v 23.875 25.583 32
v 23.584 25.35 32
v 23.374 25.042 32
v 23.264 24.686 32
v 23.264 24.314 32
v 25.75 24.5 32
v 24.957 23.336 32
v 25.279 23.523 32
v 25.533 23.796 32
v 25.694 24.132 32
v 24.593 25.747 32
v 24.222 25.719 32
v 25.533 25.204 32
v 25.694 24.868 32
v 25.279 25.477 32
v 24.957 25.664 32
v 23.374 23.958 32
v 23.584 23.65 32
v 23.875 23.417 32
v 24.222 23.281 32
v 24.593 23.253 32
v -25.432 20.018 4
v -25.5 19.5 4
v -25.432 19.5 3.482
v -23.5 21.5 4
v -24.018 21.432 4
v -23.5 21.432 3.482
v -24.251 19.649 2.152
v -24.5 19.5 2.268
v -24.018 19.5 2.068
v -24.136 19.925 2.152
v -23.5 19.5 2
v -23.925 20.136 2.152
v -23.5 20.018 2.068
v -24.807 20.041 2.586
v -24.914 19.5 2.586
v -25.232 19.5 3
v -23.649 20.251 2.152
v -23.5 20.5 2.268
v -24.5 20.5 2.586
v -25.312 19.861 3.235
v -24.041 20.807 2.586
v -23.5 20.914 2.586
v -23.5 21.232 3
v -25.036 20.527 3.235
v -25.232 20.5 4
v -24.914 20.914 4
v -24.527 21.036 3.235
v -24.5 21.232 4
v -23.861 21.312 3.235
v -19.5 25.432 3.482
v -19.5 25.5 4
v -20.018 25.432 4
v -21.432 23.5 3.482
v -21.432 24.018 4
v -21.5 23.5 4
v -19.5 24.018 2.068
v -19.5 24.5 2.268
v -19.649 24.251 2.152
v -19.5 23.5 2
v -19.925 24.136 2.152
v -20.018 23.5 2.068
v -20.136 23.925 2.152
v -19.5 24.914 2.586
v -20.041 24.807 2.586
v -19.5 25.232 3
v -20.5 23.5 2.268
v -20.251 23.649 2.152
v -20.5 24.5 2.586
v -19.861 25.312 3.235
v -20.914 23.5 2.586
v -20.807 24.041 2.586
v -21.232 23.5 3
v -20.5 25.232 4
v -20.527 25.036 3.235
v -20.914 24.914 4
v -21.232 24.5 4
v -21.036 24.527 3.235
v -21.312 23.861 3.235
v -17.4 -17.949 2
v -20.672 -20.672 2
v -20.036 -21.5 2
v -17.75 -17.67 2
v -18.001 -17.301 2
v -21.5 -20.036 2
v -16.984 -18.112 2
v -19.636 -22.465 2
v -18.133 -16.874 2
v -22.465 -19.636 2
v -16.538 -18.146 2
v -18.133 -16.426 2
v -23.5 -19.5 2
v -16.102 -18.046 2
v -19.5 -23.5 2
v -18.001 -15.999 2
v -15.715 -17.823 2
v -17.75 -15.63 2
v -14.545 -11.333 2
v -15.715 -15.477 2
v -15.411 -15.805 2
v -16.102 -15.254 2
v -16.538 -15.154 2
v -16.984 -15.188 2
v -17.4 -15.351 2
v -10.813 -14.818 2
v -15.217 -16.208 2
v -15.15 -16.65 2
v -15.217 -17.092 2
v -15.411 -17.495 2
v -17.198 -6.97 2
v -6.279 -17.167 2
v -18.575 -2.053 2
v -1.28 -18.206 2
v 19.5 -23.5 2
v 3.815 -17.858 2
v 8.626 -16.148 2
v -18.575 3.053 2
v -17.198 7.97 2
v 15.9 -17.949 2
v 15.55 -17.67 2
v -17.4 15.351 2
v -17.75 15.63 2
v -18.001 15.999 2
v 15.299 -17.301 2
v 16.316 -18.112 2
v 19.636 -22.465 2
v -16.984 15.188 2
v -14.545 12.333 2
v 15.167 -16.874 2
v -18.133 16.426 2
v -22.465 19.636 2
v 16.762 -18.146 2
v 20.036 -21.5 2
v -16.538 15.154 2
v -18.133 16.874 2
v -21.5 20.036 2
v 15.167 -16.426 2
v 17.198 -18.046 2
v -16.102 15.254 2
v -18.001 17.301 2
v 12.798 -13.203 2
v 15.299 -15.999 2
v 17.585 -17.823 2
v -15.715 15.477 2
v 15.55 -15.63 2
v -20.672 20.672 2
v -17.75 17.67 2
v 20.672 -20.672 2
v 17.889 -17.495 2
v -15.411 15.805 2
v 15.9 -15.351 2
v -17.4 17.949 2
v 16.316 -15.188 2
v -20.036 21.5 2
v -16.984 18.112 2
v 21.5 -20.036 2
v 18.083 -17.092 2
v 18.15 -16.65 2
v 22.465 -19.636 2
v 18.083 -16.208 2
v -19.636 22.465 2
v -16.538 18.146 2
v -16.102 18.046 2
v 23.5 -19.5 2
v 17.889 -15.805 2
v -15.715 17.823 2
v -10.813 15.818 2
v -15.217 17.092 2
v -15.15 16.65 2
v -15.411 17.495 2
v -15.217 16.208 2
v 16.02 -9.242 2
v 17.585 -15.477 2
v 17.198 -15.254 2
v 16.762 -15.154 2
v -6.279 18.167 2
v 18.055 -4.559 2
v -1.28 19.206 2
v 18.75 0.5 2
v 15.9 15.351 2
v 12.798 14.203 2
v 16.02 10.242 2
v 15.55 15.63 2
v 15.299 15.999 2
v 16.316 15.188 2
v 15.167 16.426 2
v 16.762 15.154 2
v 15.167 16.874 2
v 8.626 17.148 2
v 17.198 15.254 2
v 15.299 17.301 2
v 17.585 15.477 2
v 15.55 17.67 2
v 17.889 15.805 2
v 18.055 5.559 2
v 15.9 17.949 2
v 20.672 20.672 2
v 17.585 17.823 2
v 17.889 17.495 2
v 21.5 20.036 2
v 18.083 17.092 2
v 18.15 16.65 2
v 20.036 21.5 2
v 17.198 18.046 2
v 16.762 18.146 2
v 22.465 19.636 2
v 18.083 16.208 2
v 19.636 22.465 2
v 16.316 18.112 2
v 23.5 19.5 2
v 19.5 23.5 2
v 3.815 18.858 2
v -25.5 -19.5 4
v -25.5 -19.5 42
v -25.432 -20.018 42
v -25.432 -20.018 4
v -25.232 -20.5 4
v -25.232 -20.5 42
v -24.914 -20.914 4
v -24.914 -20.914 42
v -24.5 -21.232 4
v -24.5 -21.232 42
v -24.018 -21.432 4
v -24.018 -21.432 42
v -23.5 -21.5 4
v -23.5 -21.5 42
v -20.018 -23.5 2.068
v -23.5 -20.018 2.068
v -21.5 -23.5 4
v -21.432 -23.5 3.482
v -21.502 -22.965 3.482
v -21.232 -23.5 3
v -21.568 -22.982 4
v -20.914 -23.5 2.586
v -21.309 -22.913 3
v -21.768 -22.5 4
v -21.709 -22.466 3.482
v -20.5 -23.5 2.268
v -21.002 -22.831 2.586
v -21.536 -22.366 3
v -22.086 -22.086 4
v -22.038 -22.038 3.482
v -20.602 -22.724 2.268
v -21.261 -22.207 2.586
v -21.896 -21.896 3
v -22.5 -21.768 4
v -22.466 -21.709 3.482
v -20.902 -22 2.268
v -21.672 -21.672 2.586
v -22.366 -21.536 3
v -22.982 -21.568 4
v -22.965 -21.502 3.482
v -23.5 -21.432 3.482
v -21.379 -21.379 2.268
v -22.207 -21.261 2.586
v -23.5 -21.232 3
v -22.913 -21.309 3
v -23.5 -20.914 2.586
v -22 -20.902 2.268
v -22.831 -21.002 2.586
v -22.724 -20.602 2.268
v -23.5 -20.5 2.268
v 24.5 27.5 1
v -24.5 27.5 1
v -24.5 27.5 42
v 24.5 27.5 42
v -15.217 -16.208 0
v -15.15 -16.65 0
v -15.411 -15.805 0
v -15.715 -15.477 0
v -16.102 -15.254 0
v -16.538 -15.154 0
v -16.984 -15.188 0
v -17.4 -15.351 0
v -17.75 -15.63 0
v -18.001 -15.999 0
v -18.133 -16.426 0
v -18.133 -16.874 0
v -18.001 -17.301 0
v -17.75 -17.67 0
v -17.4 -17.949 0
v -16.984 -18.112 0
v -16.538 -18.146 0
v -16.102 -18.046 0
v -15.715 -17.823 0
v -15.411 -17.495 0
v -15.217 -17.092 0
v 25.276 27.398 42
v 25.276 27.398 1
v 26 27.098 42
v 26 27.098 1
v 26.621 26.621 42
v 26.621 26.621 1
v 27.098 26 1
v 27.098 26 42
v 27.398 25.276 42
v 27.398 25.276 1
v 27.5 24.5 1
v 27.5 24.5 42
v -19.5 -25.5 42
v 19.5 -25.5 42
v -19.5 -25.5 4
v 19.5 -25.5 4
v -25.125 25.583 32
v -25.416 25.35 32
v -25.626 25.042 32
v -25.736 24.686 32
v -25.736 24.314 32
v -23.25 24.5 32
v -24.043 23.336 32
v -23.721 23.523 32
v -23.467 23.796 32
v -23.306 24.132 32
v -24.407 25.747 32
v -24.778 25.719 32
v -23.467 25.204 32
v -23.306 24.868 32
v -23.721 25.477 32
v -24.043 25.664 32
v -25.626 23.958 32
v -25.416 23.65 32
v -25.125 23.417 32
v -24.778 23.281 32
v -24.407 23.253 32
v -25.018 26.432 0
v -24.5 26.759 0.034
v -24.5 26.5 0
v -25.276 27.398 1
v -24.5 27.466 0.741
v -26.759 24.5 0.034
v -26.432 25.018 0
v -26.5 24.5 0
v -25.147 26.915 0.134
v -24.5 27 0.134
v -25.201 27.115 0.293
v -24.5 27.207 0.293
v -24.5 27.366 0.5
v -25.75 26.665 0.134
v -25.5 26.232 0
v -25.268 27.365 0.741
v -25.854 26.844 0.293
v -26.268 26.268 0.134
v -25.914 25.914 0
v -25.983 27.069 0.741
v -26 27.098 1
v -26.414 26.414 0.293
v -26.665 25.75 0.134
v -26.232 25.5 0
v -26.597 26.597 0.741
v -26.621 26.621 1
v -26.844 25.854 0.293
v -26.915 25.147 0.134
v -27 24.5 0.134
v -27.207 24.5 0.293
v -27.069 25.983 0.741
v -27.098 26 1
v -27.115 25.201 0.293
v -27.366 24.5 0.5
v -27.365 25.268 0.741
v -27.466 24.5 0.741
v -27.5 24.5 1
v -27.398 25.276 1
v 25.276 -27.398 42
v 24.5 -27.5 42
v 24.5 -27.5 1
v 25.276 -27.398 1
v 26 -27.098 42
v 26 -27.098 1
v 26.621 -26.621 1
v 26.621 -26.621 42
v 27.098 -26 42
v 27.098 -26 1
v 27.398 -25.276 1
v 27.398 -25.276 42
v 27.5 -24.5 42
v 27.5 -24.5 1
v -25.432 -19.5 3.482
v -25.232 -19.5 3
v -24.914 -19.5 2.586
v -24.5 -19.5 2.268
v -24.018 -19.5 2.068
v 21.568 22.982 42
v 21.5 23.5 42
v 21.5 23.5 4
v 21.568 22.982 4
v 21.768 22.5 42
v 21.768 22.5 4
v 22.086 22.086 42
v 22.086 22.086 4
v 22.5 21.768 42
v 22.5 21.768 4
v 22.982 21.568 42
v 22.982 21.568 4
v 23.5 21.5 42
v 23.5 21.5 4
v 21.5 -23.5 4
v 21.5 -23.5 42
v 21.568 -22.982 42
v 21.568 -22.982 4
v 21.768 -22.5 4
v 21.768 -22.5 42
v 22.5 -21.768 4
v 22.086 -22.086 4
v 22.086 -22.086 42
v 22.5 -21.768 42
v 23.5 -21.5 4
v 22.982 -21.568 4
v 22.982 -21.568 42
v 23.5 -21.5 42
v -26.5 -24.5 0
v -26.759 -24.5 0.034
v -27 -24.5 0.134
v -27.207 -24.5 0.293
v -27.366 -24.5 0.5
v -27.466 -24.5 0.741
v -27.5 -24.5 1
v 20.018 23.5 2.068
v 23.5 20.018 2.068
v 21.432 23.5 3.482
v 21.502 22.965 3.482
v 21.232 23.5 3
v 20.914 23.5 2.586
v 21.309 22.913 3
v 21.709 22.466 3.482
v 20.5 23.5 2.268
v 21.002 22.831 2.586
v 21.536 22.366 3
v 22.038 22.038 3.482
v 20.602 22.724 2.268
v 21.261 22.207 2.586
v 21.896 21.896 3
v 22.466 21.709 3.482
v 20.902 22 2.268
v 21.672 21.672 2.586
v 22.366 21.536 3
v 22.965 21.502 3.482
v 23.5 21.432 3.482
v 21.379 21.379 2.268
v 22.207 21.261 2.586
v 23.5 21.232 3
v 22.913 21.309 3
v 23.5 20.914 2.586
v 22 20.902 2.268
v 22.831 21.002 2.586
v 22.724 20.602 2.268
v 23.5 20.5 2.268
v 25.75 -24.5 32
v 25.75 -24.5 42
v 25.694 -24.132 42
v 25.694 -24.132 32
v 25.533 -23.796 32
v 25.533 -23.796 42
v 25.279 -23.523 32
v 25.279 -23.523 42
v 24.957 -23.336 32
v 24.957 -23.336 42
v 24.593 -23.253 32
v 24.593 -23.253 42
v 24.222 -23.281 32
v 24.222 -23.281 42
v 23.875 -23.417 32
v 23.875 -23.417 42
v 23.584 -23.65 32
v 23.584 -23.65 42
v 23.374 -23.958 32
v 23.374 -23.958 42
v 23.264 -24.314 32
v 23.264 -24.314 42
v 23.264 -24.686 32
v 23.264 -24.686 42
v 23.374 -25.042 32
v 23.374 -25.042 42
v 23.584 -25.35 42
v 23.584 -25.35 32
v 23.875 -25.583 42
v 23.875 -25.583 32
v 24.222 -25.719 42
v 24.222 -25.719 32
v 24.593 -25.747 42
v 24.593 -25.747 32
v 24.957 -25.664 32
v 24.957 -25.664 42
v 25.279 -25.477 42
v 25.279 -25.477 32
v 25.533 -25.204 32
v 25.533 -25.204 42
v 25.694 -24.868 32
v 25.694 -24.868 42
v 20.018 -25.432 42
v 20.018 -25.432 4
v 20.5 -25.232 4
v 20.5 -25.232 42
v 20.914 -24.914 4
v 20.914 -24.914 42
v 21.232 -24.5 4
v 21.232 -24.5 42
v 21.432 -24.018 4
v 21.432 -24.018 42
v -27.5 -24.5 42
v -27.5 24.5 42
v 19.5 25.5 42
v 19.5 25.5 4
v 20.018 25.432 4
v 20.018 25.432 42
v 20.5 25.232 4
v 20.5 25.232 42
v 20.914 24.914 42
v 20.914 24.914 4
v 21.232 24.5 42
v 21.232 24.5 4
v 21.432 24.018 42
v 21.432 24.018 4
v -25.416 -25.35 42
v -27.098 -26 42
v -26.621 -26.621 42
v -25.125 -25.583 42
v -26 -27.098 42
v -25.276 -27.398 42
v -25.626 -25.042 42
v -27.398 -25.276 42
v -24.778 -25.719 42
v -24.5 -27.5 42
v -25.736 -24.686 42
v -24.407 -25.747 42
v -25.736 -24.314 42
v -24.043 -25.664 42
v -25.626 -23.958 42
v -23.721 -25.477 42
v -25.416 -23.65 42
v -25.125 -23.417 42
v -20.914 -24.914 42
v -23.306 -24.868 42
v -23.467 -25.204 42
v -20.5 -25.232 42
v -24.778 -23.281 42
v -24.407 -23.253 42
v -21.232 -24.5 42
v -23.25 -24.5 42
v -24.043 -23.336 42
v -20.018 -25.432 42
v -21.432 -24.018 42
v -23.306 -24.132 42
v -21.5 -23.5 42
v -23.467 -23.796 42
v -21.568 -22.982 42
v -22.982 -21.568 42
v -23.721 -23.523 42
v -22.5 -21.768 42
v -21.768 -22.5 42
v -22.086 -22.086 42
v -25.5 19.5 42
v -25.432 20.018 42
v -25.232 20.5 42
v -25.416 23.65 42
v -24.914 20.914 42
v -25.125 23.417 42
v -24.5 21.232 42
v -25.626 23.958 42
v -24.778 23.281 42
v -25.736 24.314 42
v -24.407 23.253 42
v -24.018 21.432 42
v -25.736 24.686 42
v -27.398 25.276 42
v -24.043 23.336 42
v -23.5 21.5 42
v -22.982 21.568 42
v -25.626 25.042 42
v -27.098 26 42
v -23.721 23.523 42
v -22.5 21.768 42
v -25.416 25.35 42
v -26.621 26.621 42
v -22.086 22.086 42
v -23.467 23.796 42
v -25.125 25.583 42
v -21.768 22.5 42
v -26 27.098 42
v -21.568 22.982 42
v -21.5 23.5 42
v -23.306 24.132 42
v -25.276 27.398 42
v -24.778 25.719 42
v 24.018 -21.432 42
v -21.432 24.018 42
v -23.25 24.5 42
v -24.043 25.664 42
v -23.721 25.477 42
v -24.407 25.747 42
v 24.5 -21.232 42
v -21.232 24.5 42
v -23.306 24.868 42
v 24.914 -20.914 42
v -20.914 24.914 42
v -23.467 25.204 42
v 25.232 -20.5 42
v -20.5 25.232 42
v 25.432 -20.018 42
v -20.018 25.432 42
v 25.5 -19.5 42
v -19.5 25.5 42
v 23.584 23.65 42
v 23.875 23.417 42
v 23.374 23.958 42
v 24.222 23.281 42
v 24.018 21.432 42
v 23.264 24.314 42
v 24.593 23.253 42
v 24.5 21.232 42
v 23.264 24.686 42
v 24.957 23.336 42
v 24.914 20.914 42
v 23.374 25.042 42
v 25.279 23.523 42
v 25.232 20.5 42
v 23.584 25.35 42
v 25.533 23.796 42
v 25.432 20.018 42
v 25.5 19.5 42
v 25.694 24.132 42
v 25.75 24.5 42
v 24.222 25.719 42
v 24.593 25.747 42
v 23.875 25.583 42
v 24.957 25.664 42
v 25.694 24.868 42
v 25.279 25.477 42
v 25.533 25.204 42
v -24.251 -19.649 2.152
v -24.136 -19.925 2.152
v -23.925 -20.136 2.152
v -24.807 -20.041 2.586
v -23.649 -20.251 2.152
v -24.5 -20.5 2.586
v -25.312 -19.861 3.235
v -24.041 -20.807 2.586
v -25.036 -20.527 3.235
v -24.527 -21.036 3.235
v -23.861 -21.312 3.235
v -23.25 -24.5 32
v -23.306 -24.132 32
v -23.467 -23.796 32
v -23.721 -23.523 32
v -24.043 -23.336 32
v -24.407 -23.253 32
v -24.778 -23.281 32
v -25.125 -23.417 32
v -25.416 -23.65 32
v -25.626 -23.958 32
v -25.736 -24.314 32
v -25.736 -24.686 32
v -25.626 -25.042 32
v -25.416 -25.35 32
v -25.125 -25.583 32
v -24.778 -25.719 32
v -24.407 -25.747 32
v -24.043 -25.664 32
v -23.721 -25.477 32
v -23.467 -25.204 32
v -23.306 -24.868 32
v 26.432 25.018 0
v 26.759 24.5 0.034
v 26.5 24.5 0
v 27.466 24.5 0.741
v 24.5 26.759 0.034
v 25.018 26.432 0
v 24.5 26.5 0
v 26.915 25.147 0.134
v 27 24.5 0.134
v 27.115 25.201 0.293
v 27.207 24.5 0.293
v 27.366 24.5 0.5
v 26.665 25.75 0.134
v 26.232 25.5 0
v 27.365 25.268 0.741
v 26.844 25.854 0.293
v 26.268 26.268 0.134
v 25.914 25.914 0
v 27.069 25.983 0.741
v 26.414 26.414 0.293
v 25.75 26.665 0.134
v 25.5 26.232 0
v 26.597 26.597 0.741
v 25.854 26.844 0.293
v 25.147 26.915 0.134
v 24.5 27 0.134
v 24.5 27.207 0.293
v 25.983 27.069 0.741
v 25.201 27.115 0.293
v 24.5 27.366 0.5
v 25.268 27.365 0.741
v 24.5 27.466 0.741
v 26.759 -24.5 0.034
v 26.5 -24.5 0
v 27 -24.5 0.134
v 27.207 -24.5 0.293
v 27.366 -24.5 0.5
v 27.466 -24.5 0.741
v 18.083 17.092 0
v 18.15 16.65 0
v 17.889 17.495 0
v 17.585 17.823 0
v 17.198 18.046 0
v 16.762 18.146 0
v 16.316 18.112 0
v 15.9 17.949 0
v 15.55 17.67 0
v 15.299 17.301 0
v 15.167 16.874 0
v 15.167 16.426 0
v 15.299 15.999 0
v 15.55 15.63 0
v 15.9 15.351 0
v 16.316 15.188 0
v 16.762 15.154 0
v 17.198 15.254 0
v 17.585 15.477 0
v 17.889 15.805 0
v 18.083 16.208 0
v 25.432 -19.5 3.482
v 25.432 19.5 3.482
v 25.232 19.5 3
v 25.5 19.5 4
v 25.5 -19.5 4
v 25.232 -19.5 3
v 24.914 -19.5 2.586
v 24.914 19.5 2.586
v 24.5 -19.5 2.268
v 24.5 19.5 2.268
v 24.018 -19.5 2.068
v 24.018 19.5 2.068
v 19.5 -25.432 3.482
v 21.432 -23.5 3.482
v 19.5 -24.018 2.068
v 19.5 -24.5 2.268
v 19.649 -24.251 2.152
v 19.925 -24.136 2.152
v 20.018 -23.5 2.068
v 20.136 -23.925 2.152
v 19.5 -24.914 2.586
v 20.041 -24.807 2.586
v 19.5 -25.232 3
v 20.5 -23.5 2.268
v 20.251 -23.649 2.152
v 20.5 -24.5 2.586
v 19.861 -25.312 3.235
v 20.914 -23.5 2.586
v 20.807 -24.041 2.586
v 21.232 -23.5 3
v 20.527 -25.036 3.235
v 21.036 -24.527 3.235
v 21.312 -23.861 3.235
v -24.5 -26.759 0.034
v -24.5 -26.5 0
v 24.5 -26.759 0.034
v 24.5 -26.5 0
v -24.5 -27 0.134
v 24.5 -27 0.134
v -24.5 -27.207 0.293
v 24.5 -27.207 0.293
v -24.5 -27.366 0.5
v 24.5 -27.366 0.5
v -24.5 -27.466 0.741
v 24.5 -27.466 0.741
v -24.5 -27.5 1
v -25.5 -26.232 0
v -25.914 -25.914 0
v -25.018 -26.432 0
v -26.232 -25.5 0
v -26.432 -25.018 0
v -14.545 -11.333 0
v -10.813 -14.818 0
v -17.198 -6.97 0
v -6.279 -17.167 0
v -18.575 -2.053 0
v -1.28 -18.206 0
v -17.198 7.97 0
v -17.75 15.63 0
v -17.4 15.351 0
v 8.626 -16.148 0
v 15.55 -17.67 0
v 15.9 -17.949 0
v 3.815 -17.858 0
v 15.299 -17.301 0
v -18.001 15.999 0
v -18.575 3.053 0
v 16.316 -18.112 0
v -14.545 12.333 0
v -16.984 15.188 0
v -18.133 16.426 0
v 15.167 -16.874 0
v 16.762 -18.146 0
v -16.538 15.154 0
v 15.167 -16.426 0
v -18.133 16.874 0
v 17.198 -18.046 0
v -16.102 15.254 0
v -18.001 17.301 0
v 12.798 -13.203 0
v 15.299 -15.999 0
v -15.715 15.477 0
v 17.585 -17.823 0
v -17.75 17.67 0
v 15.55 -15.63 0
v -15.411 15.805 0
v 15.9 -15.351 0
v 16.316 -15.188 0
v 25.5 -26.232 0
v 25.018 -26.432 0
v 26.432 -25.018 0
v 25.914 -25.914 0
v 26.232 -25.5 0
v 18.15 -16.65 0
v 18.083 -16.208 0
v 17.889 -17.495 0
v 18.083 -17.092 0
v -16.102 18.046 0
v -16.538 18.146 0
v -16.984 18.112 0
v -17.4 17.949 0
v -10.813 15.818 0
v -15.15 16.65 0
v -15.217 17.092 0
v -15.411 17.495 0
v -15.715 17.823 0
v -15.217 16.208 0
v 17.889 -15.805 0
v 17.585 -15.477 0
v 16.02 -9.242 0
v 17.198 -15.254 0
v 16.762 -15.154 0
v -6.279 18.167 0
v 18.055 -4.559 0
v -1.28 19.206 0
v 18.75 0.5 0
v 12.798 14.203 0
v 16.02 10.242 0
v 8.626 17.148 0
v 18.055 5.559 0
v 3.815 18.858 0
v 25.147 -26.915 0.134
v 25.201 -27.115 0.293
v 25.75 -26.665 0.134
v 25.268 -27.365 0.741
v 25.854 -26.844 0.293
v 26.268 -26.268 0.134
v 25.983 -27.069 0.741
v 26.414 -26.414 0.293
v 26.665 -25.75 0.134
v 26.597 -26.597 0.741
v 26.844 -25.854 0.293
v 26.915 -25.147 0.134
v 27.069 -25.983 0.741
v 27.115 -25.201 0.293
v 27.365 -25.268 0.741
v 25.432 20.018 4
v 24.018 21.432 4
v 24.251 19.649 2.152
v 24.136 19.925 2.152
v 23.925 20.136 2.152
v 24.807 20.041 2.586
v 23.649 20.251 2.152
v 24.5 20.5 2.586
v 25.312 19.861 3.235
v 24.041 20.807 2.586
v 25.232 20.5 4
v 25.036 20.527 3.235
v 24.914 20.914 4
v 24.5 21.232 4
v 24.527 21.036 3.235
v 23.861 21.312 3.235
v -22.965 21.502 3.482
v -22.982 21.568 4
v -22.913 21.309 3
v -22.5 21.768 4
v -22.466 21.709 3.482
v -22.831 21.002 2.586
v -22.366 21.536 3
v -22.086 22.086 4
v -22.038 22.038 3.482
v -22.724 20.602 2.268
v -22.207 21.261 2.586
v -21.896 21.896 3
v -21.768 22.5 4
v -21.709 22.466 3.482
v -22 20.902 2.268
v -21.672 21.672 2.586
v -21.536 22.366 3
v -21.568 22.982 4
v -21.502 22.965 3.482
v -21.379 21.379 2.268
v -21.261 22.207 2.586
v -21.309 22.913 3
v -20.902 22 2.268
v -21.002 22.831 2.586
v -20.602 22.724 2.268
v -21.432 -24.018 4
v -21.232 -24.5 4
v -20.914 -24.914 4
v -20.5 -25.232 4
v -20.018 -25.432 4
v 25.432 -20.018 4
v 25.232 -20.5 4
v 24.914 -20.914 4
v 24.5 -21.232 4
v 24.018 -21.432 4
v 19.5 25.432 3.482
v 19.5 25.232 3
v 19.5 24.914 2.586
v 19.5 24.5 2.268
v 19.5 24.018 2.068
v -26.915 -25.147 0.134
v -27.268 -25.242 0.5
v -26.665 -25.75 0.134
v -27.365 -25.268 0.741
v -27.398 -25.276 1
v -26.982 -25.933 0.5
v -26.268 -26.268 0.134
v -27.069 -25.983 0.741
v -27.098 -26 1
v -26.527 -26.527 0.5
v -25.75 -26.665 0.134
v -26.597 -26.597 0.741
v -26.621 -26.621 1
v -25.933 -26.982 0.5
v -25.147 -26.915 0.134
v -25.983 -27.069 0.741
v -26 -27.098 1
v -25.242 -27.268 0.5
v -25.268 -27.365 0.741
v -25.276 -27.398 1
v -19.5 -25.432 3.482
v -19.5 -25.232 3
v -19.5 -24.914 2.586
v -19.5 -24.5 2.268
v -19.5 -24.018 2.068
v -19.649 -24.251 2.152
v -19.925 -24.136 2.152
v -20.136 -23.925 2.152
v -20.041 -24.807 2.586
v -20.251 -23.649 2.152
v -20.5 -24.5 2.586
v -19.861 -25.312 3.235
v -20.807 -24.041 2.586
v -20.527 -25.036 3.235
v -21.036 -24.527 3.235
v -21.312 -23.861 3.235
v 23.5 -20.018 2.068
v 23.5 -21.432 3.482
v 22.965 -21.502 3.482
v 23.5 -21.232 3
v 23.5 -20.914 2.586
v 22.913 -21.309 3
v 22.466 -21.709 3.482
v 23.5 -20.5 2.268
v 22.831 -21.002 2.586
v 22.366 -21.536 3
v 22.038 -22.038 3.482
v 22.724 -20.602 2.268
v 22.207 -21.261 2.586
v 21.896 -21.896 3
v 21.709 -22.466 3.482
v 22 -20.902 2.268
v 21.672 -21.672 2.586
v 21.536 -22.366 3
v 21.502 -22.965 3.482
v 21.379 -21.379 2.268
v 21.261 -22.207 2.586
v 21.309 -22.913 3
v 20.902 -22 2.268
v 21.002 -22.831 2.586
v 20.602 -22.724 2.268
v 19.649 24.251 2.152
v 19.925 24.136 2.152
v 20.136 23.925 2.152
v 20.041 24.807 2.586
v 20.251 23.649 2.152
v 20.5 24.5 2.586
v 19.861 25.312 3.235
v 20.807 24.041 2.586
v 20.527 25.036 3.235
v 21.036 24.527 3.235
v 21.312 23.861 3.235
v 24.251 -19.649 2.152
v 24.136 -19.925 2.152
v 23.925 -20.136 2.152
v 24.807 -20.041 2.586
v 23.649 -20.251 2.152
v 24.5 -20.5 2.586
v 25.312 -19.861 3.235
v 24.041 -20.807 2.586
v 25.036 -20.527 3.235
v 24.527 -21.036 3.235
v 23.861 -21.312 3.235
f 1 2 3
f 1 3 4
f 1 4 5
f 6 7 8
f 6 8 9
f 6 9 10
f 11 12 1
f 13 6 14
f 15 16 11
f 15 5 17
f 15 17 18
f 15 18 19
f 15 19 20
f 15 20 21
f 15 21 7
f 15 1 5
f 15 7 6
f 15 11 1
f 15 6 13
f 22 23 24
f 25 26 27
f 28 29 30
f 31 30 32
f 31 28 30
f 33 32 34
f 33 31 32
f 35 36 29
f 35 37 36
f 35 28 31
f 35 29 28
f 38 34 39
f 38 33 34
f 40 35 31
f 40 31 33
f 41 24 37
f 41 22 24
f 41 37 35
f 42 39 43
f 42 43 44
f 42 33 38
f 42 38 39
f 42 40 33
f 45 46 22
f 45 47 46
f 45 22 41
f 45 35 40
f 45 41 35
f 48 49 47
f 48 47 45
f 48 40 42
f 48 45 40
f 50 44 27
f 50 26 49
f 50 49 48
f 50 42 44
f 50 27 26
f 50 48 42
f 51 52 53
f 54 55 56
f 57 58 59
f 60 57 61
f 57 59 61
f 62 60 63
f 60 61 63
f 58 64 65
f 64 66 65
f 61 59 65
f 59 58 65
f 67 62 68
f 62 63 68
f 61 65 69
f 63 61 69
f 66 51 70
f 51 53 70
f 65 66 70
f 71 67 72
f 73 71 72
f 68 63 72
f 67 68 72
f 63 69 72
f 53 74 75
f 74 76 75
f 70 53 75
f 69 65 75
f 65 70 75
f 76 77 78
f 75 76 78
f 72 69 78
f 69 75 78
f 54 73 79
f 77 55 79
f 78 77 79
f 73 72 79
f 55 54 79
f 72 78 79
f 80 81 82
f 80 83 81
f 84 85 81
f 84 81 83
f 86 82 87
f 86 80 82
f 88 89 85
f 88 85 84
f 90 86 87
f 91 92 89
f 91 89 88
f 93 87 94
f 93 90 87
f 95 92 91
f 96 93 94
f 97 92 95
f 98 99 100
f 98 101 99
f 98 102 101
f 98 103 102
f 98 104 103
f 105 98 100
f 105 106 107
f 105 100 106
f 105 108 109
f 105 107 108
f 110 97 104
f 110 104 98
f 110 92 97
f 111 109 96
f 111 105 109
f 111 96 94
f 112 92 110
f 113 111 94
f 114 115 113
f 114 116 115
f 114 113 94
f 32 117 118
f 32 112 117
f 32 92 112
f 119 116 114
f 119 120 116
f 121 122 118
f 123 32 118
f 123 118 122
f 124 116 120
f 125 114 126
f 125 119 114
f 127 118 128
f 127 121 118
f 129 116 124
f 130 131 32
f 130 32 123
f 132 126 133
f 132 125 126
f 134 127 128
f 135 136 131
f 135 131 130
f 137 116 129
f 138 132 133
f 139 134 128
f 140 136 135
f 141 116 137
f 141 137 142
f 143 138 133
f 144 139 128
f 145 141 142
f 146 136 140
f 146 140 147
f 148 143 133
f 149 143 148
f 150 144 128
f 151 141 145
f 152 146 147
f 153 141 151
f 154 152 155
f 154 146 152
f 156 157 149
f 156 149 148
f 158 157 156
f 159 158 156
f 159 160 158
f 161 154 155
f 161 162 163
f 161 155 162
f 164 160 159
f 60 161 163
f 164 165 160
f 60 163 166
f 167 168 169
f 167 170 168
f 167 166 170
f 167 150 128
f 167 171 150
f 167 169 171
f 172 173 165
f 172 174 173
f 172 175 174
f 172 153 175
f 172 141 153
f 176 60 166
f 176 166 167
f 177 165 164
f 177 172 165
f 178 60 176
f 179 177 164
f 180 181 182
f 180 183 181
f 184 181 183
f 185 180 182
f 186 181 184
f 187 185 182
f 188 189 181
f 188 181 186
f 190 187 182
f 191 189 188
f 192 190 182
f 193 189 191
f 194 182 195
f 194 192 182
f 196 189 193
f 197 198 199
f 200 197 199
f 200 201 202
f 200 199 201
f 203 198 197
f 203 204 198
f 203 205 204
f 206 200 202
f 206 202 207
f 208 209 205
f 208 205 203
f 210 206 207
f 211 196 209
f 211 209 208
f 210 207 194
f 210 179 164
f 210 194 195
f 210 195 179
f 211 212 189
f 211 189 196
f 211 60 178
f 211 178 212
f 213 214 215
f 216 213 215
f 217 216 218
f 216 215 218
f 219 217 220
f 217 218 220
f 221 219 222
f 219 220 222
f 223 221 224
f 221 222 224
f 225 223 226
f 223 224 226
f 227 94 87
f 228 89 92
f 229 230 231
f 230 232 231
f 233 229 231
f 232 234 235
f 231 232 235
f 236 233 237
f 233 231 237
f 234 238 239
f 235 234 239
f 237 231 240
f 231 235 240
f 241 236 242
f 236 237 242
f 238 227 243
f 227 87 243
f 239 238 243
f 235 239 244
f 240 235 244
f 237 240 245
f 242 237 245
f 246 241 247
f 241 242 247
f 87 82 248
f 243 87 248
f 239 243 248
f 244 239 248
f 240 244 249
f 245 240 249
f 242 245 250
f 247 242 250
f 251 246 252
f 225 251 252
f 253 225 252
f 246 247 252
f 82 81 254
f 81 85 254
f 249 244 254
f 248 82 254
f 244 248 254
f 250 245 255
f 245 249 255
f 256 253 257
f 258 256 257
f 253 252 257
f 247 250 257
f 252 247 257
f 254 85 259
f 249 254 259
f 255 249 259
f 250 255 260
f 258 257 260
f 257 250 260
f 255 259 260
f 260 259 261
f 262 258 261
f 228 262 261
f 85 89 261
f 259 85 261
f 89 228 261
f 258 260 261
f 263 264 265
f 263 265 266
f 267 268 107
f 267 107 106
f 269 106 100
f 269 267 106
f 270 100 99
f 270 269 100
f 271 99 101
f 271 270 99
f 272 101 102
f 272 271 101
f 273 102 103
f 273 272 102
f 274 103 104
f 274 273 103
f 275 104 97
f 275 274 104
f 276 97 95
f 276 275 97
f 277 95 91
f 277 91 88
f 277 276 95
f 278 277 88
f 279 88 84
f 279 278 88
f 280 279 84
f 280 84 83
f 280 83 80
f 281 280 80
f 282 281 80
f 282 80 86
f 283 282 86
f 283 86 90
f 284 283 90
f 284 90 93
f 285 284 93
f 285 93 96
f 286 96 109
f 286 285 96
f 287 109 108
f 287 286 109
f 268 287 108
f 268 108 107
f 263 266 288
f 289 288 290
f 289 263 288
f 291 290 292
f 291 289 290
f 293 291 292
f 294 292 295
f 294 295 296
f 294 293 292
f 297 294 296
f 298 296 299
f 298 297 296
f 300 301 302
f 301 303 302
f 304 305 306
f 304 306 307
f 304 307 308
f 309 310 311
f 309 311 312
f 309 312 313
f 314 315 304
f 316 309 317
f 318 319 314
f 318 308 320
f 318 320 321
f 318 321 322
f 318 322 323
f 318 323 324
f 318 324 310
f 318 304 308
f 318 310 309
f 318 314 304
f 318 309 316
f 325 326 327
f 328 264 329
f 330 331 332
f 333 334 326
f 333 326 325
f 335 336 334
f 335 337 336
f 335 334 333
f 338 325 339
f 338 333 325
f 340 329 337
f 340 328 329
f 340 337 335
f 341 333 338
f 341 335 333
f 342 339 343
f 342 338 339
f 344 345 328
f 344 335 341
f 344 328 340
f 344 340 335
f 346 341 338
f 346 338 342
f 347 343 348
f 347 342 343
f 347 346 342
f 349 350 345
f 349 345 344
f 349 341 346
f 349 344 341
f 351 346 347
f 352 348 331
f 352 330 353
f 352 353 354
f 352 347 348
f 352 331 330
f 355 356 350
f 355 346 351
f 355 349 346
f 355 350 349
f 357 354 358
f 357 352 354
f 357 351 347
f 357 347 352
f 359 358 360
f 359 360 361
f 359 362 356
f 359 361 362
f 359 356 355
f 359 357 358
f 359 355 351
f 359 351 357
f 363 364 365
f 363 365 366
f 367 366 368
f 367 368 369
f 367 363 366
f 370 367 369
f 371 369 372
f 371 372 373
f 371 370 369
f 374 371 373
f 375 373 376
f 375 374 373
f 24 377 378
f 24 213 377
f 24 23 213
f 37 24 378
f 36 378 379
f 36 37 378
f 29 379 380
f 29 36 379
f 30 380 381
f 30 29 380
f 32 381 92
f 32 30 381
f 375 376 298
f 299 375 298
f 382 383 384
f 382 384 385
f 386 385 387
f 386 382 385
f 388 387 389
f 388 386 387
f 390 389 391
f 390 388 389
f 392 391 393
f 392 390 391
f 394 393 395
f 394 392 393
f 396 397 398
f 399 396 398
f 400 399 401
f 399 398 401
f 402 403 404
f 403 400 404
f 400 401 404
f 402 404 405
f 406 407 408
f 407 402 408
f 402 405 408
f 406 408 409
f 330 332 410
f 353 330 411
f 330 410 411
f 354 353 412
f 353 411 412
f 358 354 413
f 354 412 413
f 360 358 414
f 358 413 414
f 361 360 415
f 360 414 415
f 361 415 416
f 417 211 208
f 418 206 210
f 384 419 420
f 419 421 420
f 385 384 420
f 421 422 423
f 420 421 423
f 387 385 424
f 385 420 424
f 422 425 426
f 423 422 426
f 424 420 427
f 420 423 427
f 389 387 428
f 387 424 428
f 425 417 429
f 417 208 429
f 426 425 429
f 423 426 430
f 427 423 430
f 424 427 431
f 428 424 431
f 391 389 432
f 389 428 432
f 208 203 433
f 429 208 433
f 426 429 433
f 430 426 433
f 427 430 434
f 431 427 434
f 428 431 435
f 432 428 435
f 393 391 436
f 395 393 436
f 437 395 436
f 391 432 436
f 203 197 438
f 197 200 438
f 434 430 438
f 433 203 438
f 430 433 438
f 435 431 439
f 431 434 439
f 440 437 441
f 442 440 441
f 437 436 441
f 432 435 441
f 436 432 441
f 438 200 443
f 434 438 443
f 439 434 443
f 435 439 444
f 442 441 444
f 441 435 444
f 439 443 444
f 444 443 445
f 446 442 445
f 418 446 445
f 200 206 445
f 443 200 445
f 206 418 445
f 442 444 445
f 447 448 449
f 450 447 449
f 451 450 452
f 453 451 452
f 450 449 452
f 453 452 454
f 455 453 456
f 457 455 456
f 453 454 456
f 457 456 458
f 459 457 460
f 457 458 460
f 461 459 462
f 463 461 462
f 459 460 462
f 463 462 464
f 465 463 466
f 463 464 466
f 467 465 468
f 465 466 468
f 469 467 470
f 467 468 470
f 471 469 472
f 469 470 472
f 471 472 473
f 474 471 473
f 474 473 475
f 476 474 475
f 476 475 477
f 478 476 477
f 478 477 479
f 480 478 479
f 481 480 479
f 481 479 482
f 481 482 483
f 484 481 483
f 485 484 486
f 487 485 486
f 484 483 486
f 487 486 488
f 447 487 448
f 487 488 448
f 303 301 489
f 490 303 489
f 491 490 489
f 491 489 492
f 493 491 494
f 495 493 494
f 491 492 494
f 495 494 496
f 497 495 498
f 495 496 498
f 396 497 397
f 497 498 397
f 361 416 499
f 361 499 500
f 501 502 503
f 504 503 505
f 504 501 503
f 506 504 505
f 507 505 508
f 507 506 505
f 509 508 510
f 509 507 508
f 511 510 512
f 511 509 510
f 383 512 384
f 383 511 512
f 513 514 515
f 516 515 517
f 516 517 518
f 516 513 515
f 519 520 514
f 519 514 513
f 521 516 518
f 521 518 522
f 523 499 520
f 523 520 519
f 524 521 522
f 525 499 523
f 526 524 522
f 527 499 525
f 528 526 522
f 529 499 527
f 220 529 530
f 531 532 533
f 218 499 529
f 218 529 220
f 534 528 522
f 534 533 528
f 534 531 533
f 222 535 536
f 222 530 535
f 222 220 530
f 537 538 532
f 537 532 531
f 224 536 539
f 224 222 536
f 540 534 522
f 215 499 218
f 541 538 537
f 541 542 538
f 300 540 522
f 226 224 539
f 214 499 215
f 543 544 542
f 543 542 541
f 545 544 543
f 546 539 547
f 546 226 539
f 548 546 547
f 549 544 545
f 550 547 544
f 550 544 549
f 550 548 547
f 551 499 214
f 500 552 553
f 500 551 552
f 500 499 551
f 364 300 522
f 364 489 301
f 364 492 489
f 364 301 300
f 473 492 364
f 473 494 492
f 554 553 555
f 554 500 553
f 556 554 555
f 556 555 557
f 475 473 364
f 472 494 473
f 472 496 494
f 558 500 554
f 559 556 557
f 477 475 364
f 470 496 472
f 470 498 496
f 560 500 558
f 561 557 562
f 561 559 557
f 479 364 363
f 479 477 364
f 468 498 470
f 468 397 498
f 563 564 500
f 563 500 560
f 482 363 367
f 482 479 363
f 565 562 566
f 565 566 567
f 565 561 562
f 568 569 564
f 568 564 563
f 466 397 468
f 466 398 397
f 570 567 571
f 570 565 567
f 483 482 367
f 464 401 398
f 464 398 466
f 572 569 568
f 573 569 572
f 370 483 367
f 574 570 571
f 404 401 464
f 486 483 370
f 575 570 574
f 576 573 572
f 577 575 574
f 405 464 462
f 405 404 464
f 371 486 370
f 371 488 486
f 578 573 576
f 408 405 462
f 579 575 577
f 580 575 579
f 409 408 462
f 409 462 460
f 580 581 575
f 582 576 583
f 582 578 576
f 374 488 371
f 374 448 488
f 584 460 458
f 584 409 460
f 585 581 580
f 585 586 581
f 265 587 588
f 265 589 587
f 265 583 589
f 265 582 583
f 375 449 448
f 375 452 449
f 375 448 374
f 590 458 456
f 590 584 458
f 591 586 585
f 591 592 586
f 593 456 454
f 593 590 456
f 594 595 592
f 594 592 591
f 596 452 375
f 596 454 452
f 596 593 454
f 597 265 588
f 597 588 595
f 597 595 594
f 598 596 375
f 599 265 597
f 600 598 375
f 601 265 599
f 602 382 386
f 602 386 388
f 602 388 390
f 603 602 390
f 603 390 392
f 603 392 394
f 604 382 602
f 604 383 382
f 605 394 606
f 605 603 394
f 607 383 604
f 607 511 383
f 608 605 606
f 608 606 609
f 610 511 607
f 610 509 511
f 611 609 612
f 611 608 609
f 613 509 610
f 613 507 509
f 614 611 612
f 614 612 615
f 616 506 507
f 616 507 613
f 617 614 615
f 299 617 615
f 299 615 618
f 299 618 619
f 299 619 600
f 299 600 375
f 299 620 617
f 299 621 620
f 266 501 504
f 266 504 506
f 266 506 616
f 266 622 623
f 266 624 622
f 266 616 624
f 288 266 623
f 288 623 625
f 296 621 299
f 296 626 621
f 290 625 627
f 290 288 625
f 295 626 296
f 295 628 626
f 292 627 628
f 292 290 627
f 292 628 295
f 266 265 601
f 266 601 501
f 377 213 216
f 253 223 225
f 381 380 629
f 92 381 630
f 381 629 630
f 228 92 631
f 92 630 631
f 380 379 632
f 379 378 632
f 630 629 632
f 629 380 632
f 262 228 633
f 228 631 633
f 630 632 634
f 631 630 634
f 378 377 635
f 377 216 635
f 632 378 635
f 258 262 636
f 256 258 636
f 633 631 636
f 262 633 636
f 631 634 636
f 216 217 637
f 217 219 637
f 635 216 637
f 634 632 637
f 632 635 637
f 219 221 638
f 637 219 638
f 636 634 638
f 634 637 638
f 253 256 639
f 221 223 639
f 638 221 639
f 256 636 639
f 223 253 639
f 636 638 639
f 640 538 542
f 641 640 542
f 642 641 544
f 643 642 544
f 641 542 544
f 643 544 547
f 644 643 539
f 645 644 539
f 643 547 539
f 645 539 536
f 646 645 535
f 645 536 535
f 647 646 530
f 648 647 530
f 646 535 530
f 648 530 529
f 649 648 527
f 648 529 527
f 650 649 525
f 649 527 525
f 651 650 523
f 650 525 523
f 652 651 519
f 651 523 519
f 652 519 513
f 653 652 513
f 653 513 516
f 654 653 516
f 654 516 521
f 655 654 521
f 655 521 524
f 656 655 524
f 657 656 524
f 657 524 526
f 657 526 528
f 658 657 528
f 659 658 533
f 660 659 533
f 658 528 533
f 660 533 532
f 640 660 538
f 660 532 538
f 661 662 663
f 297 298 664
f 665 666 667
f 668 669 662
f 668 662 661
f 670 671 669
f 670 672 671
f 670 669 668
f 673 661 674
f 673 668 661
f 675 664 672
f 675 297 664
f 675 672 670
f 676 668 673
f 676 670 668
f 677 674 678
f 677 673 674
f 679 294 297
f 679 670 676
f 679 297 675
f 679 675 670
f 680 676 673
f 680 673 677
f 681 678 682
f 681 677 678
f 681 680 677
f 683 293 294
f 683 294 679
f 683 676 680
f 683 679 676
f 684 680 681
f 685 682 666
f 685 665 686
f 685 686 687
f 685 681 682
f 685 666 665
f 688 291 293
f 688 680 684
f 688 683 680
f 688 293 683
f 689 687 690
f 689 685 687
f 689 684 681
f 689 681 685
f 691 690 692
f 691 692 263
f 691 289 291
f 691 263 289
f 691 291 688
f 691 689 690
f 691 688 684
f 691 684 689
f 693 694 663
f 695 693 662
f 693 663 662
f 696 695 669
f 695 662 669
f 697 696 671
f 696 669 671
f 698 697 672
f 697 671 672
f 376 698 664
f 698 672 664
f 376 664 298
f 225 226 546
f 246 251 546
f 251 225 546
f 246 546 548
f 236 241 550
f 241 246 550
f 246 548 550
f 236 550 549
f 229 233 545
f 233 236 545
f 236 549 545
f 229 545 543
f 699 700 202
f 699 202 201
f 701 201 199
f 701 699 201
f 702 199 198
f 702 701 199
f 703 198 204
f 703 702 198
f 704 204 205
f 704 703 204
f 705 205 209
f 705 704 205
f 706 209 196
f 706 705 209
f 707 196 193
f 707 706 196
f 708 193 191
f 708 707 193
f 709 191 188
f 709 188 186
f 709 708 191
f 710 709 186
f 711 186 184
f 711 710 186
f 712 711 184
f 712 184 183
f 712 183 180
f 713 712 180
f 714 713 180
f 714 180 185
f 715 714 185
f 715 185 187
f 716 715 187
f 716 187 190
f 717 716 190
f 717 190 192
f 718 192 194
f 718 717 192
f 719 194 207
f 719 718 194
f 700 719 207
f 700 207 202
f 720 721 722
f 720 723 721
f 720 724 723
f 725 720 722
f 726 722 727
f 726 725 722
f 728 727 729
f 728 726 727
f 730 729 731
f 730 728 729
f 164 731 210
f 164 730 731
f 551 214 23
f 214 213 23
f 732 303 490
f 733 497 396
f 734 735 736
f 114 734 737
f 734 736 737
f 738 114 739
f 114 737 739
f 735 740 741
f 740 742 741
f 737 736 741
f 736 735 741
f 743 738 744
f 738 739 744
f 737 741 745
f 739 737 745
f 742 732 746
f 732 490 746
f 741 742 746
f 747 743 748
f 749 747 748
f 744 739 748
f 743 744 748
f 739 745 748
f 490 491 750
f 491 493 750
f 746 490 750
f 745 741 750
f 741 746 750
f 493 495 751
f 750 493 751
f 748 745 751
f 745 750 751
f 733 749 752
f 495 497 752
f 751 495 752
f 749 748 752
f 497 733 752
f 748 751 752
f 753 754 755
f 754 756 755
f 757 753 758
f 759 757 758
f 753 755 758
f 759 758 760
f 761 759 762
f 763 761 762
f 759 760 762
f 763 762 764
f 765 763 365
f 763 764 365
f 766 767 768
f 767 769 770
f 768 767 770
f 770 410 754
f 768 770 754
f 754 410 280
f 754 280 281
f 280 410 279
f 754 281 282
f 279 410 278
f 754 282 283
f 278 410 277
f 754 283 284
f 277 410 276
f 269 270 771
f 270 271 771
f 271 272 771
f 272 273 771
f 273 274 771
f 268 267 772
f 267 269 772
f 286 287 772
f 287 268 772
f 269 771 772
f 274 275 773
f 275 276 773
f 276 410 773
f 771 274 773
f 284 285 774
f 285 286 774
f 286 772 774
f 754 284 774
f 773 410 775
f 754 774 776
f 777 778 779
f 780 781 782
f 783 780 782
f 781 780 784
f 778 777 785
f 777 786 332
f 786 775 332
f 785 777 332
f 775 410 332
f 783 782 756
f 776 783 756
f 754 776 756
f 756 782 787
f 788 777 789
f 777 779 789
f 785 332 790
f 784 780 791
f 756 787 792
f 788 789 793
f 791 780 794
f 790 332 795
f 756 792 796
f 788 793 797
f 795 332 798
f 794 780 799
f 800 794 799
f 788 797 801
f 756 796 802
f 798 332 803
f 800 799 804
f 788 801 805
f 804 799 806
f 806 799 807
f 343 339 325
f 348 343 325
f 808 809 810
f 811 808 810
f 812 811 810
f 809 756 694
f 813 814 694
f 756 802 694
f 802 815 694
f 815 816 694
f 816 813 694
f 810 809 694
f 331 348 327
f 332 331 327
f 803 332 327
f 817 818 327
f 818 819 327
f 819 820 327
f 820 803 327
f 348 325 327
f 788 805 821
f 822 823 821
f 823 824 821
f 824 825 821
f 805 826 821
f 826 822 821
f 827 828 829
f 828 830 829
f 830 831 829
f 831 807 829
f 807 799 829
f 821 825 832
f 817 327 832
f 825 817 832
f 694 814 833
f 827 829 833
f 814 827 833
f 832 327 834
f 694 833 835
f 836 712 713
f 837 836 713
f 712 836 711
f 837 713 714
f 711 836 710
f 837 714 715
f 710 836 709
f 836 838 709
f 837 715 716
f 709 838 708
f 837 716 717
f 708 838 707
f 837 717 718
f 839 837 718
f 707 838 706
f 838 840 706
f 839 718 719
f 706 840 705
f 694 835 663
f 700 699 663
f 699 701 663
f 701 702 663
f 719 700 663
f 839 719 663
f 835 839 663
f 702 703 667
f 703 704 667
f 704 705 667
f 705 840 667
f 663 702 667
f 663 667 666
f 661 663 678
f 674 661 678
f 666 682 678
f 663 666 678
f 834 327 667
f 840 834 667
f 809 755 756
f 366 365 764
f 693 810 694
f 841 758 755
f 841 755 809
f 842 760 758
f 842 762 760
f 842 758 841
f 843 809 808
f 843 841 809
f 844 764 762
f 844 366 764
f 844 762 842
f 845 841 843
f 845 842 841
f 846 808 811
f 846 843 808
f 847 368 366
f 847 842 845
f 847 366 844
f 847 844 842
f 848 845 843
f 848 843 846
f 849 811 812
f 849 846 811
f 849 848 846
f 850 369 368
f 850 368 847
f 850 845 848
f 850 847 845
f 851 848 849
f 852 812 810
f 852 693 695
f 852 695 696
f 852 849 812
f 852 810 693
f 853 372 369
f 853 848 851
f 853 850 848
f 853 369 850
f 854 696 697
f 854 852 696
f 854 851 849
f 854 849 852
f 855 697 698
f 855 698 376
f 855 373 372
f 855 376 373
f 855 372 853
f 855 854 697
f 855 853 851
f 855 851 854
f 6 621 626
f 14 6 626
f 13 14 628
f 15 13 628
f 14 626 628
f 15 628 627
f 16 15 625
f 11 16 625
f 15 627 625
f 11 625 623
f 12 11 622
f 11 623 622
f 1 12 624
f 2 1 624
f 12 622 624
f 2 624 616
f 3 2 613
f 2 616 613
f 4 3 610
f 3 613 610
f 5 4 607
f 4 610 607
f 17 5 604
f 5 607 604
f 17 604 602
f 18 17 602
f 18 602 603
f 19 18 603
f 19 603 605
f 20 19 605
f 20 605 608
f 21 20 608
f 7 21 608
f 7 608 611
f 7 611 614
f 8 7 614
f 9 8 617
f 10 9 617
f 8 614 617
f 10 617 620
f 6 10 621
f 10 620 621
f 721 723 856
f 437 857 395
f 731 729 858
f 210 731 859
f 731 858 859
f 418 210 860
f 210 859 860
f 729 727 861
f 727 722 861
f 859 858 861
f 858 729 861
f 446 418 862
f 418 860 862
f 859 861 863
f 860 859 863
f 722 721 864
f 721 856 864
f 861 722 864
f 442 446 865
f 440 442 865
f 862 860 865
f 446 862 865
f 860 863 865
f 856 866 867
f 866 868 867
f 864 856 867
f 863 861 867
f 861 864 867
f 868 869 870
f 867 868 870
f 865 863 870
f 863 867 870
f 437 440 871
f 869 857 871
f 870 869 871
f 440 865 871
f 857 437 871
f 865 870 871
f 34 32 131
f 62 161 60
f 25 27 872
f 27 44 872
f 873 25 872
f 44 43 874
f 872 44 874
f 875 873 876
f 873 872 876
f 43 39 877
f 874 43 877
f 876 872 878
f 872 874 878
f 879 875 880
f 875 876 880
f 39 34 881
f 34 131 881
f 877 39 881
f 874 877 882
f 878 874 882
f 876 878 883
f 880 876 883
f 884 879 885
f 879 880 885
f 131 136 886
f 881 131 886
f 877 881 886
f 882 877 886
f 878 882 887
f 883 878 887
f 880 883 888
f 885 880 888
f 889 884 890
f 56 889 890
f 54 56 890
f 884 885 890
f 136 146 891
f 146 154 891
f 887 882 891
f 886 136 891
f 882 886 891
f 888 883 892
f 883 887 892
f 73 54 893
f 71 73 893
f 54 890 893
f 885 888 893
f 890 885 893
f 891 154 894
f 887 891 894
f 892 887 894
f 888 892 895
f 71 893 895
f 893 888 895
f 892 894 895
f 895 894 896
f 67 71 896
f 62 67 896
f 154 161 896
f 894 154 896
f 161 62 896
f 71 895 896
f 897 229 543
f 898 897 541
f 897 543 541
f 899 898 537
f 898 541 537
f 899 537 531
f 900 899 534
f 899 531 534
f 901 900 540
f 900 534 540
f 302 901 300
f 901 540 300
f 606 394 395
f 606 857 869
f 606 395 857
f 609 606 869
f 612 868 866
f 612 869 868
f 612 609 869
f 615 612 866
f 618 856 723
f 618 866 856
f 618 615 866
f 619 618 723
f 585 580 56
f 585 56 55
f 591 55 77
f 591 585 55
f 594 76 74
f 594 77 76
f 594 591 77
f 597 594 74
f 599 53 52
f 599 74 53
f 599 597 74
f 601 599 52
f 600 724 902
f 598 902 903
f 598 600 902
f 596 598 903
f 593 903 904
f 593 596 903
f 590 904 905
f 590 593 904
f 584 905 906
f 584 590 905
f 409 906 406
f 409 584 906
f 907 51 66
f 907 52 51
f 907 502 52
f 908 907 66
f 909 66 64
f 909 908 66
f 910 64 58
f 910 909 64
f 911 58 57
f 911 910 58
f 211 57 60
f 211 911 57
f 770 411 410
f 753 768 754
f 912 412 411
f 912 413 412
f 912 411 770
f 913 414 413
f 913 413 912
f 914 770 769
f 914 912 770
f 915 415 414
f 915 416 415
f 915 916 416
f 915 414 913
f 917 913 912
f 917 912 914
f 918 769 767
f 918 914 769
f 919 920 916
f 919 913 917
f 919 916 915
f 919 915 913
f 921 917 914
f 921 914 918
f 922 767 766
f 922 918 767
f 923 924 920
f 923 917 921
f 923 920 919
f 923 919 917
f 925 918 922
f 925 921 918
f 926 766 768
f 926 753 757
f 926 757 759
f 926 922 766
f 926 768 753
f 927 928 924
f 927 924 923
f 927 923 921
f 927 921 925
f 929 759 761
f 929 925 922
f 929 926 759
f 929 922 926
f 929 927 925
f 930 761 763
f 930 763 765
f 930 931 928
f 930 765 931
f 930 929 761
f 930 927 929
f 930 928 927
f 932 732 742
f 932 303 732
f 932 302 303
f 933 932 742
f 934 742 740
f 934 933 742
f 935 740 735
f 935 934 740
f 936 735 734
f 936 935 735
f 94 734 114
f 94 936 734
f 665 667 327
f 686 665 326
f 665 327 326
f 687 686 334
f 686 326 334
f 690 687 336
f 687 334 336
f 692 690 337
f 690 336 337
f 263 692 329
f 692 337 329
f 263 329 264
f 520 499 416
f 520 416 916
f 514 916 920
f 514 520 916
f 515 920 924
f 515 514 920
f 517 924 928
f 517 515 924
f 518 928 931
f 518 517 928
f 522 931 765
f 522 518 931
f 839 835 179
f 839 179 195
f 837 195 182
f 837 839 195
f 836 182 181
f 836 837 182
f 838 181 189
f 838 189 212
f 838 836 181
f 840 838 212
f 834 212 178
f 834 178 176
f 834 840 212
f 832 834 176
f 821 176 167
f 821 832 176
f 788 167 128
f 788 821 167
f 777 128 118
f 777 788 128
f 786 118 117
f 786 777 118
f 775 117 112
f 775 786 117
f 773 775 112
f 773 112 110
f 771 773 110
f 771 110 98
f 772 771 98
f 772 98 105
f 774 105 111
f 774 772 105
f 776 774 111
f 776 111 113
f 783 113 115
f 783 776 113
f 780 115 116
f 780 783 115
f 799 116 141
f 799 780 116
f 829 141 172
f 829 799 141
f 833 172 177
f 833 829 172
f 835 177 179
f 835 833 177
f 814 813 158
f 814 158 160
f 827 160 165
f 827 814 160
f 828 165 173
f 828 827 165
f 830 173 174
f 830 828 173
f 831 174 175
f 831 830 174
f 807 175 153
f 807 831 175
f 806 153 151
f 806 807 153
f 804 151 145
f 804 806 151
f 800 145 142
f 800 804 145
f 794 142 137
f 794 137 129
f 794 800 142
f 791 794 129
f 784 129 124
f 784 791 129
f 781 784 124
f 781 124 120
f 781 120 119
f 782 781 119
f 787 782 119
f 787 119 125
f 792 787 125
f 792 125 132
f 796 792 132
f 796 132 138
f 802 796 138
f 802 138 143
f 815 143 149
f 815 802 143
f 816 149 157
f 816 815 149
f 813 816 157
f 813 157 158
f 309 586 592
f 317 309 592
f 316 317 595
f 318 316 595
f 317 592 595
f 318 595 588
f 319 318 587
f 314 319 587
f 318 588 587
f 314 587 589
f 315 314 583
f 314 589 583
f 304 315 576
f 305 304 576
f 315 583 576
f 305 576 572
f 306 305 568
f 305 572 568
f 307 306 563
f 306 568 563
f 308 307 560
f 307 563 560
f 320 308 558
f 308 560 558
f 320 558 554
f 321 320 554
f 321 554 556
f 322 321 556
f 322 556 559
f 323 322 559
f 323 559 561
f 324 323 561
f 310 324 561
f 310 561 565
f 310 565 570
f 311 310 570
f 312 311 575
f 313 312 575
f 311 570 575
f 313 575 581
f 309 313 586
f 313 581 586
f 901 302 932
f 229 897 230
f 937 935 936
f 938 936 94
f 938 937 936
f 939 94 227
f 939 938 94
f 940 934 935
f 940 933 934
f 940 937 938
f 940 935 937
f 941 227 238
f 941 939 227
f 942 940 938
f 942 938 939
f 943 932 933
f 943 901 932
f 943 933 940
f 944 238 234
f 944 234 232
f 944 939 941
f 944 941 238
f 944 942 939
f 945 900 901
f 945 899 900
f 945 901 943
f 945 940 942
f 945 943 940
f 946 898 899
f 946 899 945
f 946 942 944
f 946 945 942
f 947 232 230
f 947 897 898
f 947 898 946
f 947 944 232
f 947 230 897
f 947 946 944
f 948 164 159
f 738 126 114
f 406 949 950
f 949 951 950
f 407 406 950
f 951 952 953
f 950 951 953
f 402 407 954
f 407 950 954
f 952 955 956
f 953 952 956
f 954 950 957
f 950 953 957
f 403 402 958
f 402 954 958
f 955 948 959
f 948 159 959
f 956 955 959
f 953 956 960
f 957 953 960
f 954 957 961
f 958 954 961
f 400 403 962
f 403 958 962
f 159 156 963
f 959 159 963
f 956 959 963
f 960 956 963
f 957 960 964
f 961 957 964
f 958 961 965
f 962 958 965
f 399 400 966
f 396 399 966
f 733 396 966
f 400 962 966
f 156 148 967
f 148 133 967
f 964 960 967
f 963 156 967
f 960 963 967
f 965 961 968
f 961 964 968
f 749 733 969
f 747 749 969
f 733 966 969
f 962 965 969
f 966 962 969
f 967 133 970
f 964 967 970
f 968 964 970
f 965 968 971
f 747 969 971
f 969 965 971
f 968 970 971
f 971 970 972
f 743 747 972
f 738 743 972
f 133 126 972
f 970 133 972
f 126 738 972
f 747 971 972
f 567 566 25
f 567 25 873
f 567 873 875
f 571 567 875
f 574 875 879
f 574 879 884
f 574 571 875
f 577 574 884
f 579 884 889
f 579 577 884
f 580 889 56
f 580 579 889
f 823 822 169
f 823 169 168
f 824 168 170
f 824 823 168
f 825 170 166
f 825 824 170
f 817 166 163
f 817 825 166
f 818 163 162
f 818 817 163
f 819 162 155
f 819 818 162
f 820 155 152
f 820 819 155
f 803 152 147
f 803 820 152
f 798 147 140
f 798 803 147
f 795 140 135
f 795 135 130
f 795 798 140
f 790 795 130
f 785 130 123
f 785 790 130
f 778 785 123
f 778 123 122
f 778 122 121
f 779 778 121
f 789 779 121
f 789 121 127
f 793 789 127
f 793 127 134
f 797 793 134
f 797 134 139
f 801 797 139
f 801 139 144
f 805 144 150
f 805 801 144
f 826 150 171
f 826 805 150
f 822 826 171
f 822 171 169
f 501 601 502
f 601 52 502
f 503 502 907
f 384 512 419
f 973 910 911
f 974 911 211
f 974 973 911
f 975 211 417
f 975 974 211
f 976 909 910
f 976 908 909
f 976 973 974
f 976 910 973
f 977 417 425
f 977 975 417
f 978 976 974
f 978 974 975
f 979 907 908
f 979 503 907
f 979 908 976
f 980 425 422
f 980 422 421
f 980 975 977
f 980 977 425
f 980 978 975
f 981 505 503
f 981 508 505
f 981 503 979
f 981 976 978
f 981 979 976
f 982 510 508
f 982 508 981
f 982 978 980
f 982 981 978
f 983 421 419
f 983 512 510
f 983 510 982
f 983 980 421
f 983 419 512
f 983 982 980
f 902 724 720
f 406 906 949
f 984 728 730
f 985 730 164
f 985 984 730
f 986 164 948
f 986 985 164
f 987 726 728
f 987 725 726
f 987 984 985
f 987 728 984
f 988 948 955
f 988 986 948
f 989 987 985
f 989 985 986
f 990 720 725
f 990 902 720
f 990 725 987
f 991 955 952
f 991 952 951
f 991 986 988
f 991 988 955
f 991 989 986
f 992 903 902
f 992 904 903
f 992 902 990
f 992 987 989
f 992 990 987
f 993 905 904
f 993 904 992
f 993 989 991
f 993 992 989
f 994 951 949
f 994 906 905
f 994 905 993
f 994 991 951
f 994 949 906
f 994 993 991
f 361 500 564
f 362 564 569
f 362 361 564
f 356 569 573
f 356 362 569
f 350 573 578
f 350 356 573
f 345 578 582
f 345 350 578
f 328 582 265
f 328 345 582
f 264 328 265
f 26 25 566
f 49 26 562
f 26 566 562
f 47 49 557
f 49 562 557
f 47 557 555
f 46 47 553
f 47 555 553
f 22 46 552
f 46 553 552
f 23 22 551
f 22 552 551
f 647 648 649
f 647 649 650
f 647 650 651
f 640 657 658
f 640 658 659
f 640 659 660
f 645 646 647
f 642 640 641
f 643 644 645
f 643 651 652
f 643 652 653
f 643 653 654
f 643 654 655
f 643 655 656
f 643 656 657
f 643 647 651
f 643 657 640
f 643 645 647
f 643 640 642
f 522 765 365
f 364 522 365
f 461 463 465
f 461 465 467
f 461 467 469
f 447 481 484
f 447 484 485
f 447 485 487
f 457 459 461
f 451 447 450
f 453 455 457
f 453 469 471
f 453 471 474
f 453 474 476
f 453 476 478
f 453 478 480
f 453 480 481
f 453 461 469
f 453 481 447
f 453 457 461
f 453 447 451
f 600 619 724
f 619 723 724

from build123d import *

# Parameters (mm, degrees)
F0_W     = 55
F0_H     = 55
F0_R     = 1.5
F0_R_2   = 18.75
F1_DEPTH = 2
F2_W     = 55
F2_H     = 55
F3_DEPTH = 40
F4_R     = 1.25
F5_DEPTH = 10
F6_R     = 3
F7_R     = 1
F8_F1_R  = 2
F8_F2_R  = 1.9999


# Not quite as in the source:
# - a fillet or chamfer is up to 0.001 mm smaller than in the source, because OpenCascade refuses the exact size


with BuildPart() as f1:
    # F0 (on Top) → F1 (new body)
    with BuildSketch(Plane.XY):
        Rectangle(F0_W, F0_H)
        with Locations((-16.65, -16.65)):
            Circle(F0_R, mode=Mode.SUBTRACT)
        with Locations((16.65, -16.65)):
            Circle(F0_R, mode=Mode.SUBTRACT)
        with Locations((-16.65, 16.65)):
            Circle(F0_R, mode=Mode.SUBTRACT)
        with Locations((0, 0.5)):
            Circle(F0_R_2, mode=Mode.SUBTRACT)
        with Locations((16.65, 16.65)):
            Circle(F0_R, mode=Mode.SUBTRACT)
    extrude(amount=F1_DEPTH)

    # F2 (on face) → F3 (join)
    with BuildSketch(Plane.XY.offset(2)):
        Rectangle(F2_W, F2_H)
        Polygon((-21.5, 21.5), (-21.5, 25.5), (21.5, 25.5), (21.5, 21.5), (25.5, 21.5), (25.5, -21.5), (21.5, -21.5), (21.5, -25.5), (-21.5, -25.5), (-21.5, -21.5), (-25.5, -21.5), (-25.5, 21.5), align=None, mode=Mode.SUBTRACT)
    extrude(amount=F3_DEPTH)

    # F4 (on face) → F5 (cut)
    with BuildSketch(Plane.XY.offset(42)):
        with Locations((-24.5, 24.5)):
            Circle(F4_R)
        with Locations((-24.5, -24.5)):
            Circle(F4_R)
        with Locations((24.5, -24.5)):
            Circle(F4_R)
        with Locations((24.5, 24.5)):
            Circle(F4_R)
    extrude(amount=-F5_DEPTH, mode=Mode.SUBTRACT)

    # F6
    f6_edges = [f1.edges().sort_by_distance(p)[0] for p in [
        (-27.5, -27.5, 21),
        (27.5, -27.5, 21),
        (-27.5, 27.5, 21),
        (27.5, 27.5, 21),
    ]]
    fillet(f6_edges, radius=F6_R)

    # F7
    f7_edges = [f1.edges().sort_by_distance(p)[0] for p in [
        (0, -27.5, 0),
        (27.5, 0, 0),
        (26.62132, -26.62132, 0),
        (26.62132, 26.62132, 0),
        (0, 27.5, 0),
        (-26.62132, -26.62132, 0),
        (-26.62132, 26.62132, 0),
        (-27.5, 0, 0),
    ]]
    fillet(f7_edges, radius=F7_R)

    # F8: fillet of radius 2 on 20 edges, made by hand

    # F8_f1
    f8_f1_edges = [f1.edges().sort_by_distance(p)[0] for p in [
        (21.5, -21.5, 22),
        (-21.5, -21.5, 22),
        (-21.5, 21.5, 22),
        (21.5, 21.5, 22),
    ]]
    fillet(f8_f1_edges, radius=F8_F1_R)

    # F8_f2 (radius 2 in the source; OpenCascade refuses exactly that, so slightly less here)
    f8_f2_edges = [f1.edges().sort_by_distance(p)[0] for p in [
        (-21.5, -25.5, 22),
        (-25.5, -21.5, 22),
        (21.5, -25.5, 22),
        (25.5, -21.5, 22),
        (-25.5, 21.5, 22),
        (-21.5, 25.5, 22),
        (21.5, 25.5, 22),
        (25.5, 21.5, 22),
        (0, -25.5, 2),
        (25.5, 0, 2),
        (-25.5, 0, 2),
        (0, 25.5, 2),
        (-24.5, -21.5, 2),
        (-21.5, 24.5, 2),
        (21.5, -24.5, 2),
        (24.5, 21.5, 2),
        (22.0857864376, 22.0857864376, 2),
        (22.0857864376, -22.0857864376, 2),
        (-22.0857864376, 22.0857864376, 2),
        (-22.0857864376, -22.0857864376, 2),
    ]]
    fillet(f8_f2_edges, radius=F8_F2_R)


solid = f1.part
